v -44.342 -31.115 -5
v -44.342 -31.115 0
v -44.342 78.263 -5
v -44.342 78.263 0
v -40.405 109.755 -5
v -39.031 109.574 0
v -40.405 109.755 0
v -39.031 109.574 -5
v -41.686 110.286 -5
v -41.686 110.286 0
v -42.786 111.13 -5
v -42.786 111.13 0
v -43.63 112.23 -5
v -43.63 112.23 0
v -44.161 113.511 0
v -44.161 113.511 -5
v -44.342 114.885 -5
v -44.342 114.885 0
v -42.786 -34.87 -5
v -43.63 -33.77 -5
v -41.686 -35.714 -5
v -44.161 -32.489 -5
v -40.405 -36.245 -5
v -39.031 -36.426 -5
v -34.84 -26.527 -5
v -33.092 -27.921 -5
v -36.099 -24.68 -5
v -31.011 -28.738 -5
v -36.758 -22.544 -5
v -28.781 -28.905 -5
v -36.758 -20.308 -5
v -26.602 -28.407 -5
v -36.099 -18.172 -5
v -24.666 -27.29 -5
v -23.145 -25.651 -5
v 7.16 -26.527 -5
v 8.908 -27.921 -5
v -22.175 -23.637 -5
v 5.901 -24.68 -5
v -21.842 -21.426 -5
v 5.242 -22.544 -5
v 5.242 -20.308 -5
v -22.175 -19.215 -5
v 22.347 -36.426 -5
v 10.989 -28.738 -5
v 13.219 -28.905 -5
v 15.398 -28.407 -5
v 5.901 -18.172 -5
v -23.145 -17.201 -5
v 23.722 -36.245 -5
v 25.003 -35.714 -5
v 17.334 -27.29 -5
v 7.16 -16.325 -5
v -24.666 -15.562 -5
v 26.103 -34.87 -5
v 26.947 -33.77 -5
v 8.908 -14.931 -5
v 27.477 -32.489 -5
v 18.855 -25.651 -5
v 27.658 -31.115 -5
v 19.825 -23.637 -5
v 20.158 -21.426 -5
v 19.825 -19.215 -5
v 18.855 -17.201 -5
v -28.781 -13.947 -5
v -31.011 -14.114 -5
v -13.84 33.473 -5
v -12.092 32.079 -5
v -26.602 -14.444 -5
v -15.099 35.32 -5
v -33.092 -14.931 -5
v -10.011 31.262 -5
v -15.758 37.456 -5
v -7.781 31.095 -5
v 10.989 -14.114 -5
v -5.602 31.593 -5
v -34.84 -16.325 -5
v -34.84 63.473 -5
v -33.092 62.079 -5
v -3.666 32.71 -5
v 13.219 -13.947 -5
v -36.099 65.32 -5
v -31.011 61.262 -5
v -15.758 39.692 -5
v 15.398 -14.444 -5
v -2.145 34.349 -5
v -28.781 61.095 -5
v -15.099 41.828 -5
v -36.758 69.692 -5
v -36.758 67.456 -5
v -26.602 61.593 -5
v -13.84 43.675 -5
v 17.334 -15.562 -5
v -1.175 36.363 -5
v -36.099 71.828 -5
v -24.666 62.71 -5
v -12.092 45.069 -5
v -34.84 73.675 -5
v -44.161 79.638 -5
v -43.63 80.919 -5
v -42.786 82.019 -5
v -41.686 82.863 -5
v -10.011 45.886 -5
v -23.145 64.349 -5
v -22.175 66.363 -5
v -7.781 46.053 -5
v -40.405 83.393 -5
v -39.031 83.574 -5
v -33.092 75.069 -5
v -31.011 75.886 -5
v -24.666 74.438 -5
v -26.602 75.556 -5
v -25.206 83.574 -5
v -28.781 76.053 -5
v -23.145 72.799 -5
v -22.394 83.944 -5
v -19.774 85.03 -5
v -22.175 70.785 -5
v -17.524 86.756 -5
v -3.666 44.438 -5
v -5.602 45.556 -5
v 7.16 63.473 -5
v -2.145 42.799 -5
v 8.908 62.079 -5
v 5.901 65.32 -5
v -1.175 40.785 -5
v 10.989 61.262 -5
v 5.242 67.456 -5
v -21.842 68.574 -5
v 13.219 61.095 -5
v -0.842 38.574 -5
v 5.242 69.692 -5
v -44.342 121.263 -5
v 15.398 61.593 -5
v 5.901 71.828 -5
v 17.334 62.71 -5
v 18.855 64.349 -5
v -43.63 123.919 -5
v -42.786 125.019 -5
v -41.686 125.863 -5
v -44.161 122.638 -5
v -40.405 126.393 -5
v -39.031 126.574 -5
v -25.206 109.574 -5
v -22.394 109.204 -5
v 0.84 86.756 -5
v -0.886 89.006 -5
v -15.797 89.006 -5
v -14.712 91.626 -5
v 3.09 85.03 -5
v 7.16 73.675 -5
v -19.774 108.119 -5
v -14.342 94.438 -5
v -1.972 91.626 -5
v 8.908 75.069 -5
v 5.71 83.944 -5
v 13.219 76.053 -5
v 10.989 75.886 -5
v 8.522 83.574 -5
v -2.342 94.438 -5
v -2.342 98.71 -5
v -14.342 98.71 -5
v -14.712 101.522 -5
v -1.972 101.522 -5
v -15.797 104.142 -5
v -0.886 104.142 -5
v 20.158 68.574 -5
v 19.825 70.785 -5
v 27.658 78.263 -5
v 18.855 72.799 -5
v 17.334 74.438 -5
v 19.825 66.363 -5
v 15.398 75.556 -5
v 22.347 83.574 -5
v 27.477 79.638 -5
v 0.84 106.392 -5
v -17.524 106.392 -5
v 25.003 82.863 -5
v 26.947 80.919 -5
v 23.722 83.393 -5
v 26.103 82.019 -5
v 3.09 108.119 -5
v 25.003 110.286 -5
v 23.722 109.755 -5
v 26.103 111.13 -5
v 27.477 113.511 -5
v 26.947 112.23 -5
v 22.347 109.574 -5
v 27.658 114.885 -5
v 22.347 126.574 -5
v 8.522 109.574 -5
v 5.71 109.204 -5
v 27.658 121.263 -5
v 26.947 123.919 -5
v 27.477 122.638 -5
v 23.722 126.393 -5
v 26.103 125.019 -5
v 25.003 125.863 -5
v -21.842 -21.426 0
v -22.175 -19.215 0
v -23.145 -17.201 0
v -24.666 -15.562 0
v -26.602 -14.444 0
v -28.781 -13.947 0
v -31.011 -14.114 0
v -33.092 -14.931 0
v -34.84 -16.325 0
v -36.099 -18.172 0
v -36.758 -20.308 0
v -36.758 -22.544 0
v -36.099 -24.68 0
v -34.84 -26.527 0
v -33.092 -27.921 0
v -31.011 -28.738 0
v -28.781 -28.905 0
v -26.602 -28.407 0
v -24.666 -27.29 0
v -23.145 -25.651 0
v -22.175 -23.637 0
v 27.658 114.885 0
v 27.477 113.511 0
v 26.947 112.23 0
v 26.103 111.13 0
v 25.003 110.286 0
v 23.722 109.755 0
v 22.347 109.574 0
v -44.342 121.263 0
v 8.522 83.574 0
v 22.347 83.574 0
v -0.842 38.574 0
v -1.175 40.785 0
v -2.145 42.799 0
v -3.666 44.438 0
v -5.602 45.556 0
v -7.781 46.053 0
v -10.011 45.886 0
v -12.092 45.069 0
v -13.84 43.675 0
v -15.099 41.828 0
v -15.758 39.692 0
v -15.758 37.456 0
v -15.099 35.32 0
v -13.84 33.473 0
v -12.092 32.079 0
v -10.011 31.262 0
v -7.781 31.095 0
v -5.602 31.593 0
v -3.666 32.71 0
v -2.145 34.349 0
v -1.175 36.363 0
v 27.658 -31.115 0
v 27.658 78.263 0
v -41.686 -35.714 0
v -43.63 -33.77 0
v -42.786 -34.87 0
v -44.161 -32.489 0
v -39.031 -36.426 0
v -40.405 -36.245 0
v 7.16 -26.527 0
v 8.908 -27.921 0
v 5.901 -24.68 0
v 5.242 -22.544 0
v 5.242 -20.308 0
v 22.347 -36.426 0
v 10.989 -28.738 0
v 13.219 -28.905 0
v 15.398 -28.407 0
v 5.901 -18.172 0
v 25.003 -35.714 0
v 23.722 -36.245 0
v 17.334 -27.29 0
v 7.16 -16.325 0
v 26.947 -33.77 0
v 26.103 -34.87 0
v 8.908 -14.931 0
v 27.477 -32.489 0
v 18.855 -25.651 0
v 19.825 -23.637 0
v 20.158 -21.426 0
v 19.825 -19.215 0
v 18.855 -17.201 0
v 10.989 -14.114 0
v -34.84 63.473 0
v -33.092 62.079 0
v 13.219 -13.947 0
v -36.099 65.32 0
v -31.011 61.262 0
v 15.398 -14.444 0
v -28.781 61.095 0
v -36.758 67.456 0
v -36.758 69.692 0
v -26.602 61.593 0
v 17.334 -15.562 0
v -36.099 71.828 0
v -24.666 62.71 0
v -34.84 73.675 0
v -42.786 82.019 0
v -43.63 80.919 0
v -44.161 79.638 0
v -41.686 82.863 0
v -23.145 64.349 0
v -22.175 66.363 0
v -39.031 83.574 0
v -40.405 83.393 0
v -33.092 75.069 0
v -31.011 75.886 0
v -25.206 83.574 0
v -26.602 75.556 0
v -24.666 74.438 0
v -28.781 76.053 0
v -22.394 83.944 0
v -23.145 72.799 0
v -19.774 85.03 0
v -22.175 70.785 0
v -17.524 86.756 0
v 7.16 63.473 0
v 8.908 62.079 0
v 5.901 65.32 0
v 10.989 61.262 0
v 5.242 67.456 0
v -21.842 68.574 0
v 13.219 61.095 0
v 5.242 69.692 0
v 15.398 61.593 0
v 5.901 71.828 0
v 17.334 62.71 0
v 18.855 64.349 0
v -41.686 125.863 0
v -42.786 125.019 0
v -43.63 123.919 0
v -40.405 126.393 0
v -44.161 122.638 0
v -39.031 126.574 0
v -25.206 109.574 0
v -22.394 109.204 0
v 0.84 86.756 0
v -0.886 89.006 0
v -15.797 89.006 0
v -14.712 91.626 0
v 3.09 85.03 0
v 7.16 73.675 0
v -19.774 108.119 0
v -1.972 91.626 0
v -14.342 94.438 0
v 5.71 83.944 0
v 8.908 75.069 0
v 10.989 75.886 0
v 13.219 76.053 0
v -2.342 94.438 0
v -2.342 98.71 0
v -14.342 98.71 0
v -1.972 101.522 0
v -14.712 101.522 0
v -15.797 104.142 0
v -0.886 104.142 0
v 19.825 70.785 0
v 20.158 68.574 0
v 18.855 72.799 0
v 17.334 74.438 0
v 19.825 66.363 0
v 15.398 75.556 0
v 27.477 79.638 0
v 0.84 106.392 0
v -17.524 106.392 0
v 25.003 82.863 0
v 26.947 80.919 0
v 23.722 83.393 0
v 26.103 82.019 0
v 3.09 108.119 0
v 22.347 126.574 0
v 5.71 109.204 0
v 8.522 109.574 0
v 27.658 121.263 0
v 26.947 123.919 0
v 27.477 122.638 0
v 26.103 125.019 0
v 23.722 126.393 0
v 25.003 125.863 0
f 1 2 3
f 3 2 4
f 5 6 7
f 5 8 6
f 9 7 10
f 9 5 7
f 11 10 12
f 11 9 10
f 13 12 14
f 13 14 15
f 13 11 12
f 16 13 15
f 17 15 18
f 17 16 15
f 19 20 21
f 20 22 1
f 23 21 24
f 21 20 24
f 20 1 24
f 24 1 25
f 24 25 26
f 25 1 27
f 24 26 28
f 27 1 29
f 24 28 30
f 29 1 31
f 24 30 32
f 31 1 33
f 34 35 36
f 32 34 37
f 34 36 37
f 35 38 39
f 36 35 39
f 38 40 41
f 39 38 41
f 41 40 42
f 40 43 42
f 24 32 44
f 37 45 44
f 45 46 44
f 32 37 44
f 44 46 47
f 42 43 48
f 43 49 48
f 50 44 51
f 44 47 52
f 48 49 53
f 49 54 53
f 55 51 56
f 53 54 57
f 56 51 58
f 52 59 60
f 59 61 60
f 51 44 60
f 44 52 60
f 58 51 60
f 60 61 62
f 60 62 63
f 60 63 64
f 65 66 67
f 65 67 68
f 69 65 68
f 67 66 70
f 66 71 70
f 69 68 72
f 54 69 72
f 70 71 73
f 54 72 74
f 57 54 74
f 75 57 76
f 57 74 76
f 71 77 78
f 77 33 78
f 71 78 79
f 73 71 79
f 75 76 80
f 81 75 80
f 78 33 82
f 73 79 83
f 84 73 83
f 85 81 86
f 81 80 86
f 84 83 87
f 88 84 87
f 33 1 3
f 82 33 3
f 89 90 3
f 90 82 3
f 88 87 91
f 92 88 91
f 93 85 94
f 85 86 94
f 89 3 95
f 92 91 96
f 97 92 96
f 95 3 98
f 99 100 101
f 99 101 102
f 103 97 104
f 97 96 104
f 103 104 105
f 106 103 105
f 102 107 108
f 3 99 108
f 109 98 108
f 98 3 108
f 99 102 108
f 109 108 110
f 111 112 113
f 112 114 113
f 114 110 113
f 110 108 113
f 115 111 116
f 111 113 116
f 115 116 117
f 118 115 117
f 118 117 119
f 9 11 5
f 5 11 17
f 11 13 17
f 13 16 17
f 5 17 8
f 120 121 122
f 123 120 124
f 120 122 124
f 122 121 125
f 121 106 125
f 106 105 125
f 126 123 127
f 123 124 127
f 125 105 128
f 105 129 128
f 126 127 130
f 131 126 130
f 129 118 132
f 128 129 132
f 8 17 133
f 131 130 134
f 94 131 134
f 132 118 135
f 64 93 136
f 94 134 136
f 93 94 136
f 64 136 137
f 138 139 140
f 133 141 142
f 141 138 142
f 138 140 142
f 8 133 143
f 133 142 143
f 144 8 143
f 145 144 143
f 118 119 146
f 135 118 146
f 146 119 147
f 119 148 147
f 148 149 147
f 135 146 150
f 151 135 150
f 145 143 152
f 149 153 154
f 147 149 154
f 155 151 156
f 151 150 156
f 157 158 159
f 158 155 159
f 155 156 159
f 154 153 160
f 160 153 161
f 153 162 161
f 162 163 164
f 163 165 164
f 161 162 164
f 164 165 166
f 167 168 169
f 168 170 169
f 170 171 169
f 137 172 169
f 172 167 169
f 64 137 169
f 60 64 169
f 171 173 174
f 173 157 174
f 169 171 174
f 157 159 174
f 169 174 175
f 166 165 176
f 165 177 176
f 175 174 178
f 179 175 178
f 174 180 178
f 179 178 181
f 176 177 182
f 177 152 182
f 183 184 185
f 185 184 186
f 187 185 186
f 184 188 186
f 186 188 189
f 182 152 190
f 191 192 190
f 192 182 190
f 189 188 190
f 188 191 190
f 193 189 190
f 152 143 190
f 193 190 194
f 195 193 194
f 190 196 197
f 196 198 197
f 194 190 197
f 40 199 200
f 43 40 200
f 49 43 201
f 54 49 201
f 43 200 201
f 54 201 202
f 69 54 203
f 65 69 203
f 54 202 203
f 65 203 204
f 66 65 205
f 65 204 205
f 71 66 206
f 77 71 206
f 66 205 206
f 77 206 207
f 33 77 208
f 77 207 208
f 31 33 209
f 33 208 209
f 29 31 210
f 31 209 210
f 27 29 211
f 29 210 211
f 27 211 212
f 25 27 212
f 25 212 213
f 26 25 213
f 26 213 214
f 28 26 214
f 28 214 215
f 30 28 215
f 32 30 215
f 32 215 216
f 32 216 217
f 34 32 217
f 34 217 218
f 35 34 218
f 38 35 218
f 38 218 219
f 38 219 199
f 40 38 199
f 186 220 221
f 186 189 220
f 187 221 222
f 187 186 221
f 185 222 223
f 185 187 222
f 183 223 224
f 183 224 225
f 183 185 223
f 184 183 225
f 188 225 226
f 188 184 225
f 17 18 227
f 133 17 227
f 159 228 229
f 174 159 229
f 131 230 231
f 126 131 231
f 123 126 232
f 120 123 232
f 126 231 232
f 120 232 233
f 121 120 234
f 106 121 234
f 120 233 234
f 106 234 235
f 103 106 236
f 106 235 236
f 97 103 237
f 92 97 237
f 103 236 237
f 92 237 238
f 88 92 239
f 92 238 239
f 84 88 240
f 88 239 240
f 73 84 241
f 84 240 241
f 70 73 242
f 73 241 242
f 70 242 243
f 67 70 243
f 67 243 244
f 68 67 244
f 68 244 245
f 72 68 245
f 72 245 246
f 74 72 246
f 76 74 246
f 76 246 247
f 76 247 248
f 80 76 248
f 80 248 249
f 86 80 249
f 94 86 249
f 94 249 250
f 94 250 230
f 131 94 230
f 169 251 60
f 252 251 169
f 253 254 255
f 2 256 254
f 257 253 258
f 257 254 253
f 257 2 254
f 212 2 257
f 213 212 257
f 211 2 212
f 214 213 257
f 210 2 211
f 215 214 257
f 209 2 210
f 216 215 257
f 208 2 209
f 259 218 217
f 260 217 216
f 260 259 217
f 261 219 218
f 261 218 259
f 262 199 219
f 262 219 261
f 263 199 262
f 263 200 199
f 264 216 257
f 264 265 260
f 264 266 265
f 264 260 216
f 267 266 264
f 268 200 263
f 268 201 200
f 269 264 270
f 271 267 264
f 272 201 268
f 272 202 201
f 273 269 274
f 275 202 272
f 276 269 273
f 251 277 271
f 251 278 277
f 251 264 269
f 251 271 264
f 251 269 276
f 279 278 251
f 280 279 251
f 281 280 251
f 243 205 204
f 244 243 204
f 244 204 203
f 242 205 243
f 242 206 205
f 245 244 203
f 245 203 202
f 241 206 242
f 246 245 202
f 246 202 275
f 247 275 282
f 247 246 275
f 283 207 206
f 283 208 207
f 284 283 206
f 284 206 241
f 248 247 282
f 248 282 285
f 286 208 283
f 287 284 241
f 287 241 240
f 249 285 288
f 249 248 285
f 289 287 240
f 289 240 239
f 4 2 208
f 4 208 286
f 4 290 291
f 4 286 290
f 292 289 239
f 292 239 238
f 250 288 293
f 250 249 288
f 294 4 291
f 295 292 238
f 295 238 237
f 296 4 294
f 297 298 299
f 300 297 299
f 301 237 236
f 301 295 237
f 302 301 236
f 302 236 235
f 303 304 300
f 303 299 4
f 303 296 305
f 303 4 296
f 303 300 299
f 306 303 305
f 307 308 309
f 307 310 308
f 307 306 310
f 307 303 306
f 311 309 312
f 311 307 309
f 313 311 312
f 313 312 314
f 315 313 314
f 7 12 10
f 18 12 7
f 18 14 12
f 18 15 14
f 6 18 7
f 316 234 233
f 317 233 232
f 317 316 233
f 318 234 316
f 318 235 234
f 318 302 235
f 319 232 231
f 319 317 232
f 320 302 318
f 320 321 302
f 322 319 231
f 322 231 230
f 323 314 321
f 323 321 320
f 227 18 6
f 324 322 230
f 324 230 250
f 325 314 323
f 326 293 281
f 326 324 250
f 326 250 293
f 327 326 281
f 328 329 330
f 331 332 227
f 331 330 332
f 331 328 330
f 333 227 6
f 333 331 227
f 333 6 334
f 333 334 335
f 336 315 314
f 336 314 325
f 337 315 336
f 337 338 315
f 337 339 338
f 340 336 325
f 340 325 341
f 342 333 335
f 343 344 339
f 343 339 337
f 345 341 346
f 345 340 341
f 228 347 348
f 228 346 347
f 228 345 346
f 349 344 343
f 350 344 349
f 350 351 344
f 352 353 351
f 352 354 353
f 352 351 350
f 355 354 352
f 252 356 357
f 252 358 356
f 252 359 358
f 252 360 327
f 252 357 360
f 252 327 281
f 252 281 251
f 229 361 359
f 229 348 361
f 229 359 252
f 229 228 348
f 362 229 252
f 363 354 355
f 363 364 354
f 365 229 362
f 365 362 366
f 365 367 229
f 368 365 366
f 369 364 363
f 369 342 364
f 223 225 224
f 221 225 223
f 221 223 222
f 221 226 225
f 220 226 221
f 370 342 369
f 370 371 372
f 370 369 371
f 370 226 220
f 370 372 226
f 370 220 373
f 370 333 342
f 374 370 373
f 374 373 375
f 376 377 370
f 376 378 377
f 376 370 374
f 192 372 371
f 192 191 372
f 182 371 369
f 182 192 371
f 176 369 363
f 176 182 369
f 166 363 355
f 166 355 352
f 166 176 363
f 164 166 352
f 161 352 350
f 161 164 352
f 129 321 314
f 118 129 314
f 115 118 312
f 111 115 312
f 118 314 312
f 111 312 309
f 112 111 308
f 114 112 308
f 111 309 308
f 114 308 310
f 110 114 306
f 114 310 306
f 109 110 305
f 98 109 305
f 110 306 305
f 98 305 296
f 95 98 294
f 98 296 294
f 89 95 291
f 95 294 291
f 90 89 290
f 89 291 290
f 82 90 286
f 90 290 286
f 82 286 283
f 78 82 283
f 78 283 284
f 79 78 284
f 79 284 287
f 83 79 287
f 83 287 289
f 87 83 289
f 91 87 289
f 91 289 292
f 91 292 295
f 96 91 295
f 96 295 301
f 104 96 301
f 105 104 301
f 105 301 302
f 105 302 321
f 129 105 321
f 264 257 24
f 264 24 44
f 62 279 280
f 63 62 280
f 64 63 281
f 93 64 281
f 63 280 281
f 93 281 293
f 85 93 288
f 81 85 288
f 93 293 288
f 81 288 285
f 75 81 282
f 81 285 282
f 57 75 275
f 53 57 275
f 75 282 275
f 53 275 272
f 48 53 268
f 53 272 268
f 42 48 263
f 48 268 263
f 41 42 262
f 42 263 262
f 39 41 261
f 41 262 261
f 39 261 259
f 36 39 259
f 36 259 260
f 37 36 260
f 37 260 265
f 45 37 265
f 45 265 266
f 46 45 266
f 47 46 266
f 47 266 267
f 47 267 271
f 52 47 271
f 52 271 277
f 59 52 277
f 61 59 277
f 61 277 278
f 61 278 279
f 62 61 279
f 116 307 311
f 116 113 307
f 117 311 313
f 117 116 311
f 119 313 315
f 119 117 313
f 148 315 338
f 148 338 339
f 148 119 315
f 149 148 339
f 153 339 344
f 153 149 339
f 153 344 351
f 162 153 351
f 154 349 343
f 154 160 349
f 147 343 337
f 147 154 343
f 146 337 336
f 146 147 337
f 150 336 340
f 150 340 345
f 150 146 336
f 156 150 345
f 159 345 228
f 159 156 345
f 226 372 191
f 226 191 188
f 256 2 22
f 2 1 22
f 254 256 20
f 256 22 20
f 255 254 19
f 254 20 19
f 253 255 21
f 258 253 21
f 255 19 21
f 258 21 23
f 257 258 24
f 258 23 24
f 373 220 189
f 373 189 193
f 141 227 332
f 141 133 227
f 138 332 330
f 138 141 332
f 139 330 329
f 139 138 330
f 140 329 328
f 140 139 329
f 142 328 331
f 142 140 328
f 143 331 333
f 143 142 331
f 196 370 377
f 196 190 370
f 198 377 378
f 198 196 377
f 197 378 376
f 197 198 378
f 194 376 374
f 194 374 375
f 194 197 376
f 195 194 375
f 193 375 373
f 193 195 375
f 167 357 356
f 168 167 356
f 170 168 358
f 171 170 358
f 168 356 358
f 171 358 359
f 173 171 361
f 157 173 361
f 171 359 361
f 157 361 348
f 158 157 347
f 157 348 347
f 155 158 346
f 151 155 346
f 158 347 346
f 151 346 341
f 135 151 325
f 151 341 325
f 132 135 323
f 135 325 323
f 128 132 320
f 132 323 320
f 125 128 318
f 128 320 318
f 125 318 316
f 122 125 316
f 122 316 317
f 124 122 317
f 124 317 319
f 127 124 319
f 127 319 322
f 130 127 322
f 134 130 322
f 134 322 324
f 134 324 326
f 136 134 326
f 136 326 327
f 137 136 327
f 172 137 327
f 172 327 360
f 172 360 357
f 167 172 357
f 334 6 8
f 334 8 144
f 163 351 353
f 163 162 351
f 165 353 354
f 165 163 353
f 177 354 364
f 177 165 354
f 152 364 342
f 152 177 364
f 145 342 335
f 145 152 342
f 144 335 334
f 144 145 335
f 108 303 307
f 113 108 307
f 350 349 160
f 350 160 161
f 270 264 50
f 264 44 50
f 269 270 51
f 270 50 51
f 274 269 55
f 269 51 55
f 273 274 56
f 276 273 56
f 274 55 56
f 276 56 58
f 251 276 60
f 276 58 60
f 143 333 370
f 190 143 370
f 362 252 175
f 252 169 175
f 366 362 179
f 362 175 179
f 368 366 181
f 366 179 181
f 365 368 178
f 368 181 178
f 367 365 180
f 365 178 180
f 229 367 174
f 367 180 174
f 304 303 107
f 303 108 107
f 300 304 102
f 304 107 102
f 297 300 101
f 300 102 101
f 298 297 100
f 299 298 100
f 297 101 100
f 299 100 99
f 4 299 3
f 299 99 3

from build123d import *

# Parameters (mm, degrees)
F0_W     = 72
F0_H     = 163
F1_DEPTH = 5
F2_W     = 30
F2_H     = 26
F2_R     = 7.5
F3_DEPTH = 25
F4_R     = 10.8639610307
F5_R     = 5.3112698372


with BuildPart() as f1:
    # F0 (on Top) → F1 (new body)
    with BuildSketch(Plane.XY):
        with Locations((-8.3418504, 45.0741375387)):
            Rectangle(F0_W, F0_H)
    extrude(amount=-F1_DEPTH)

    # F2 (on face) → F3 (cut)
    with BuildSketch(Plane.XY):
        with Locations((12.6581496, 96.5741375387)):
            Rectangle(F2_W, F2_H)
        with Locations((-29.3418504, 96.5741375387)):
            Rectangle(F2_W, F2_H)
        with Locations((12.6581496, 68.5741375387)):
            Circle(F2_R)
        with Locations((-29.3418504, 68.5741375387)):
            Circle(F2_R)
        with Locations((-8.3418504, 38.5741375387)):
            Circle(F2_R)
        with Locations((-29.3418504, -21.4258624613)):
            Circle(F2_R)
        with Locations((12.6581496, -21.4258624613)):
            Circle(F2_R)
    extrude(amount=-F3_DEPTH, mode=Mode.SUBTRACT)

    # F4
    f4_edges = [f1.edges().sort_by_distance(p)[0] for p in [
        (-2.34185, 109.574138, -2.5),
        (-2.34185, 83.574138, -2.5),
        (-14.34185, 83.574138, -2.5),
        (-14.34185, 109.574138, -2.5),
    ]]
    fillet(f4_edges, radius=F4_R)

    # F5
    f5_edges = [f1.edges().sort_by_distance(p)[0] for p in [
        (27.65815, 126.574138, -2.5),
        (-44.34185, 126.574138, -2.5),
        (-44.34185, 109.574138, -2.5),
        (-44.34185, 83.574138, -2.5),
        (27.65815, 109.574138, -2.5),
        (27.65815, 83.574138, -2.5),
        (-44.34185, -36.425862, -2.5),
        (27.65815, -36.425862, -2.5),
    ]]
    fillet(f5_edges, radius=F5_R)


solid = f1.part
